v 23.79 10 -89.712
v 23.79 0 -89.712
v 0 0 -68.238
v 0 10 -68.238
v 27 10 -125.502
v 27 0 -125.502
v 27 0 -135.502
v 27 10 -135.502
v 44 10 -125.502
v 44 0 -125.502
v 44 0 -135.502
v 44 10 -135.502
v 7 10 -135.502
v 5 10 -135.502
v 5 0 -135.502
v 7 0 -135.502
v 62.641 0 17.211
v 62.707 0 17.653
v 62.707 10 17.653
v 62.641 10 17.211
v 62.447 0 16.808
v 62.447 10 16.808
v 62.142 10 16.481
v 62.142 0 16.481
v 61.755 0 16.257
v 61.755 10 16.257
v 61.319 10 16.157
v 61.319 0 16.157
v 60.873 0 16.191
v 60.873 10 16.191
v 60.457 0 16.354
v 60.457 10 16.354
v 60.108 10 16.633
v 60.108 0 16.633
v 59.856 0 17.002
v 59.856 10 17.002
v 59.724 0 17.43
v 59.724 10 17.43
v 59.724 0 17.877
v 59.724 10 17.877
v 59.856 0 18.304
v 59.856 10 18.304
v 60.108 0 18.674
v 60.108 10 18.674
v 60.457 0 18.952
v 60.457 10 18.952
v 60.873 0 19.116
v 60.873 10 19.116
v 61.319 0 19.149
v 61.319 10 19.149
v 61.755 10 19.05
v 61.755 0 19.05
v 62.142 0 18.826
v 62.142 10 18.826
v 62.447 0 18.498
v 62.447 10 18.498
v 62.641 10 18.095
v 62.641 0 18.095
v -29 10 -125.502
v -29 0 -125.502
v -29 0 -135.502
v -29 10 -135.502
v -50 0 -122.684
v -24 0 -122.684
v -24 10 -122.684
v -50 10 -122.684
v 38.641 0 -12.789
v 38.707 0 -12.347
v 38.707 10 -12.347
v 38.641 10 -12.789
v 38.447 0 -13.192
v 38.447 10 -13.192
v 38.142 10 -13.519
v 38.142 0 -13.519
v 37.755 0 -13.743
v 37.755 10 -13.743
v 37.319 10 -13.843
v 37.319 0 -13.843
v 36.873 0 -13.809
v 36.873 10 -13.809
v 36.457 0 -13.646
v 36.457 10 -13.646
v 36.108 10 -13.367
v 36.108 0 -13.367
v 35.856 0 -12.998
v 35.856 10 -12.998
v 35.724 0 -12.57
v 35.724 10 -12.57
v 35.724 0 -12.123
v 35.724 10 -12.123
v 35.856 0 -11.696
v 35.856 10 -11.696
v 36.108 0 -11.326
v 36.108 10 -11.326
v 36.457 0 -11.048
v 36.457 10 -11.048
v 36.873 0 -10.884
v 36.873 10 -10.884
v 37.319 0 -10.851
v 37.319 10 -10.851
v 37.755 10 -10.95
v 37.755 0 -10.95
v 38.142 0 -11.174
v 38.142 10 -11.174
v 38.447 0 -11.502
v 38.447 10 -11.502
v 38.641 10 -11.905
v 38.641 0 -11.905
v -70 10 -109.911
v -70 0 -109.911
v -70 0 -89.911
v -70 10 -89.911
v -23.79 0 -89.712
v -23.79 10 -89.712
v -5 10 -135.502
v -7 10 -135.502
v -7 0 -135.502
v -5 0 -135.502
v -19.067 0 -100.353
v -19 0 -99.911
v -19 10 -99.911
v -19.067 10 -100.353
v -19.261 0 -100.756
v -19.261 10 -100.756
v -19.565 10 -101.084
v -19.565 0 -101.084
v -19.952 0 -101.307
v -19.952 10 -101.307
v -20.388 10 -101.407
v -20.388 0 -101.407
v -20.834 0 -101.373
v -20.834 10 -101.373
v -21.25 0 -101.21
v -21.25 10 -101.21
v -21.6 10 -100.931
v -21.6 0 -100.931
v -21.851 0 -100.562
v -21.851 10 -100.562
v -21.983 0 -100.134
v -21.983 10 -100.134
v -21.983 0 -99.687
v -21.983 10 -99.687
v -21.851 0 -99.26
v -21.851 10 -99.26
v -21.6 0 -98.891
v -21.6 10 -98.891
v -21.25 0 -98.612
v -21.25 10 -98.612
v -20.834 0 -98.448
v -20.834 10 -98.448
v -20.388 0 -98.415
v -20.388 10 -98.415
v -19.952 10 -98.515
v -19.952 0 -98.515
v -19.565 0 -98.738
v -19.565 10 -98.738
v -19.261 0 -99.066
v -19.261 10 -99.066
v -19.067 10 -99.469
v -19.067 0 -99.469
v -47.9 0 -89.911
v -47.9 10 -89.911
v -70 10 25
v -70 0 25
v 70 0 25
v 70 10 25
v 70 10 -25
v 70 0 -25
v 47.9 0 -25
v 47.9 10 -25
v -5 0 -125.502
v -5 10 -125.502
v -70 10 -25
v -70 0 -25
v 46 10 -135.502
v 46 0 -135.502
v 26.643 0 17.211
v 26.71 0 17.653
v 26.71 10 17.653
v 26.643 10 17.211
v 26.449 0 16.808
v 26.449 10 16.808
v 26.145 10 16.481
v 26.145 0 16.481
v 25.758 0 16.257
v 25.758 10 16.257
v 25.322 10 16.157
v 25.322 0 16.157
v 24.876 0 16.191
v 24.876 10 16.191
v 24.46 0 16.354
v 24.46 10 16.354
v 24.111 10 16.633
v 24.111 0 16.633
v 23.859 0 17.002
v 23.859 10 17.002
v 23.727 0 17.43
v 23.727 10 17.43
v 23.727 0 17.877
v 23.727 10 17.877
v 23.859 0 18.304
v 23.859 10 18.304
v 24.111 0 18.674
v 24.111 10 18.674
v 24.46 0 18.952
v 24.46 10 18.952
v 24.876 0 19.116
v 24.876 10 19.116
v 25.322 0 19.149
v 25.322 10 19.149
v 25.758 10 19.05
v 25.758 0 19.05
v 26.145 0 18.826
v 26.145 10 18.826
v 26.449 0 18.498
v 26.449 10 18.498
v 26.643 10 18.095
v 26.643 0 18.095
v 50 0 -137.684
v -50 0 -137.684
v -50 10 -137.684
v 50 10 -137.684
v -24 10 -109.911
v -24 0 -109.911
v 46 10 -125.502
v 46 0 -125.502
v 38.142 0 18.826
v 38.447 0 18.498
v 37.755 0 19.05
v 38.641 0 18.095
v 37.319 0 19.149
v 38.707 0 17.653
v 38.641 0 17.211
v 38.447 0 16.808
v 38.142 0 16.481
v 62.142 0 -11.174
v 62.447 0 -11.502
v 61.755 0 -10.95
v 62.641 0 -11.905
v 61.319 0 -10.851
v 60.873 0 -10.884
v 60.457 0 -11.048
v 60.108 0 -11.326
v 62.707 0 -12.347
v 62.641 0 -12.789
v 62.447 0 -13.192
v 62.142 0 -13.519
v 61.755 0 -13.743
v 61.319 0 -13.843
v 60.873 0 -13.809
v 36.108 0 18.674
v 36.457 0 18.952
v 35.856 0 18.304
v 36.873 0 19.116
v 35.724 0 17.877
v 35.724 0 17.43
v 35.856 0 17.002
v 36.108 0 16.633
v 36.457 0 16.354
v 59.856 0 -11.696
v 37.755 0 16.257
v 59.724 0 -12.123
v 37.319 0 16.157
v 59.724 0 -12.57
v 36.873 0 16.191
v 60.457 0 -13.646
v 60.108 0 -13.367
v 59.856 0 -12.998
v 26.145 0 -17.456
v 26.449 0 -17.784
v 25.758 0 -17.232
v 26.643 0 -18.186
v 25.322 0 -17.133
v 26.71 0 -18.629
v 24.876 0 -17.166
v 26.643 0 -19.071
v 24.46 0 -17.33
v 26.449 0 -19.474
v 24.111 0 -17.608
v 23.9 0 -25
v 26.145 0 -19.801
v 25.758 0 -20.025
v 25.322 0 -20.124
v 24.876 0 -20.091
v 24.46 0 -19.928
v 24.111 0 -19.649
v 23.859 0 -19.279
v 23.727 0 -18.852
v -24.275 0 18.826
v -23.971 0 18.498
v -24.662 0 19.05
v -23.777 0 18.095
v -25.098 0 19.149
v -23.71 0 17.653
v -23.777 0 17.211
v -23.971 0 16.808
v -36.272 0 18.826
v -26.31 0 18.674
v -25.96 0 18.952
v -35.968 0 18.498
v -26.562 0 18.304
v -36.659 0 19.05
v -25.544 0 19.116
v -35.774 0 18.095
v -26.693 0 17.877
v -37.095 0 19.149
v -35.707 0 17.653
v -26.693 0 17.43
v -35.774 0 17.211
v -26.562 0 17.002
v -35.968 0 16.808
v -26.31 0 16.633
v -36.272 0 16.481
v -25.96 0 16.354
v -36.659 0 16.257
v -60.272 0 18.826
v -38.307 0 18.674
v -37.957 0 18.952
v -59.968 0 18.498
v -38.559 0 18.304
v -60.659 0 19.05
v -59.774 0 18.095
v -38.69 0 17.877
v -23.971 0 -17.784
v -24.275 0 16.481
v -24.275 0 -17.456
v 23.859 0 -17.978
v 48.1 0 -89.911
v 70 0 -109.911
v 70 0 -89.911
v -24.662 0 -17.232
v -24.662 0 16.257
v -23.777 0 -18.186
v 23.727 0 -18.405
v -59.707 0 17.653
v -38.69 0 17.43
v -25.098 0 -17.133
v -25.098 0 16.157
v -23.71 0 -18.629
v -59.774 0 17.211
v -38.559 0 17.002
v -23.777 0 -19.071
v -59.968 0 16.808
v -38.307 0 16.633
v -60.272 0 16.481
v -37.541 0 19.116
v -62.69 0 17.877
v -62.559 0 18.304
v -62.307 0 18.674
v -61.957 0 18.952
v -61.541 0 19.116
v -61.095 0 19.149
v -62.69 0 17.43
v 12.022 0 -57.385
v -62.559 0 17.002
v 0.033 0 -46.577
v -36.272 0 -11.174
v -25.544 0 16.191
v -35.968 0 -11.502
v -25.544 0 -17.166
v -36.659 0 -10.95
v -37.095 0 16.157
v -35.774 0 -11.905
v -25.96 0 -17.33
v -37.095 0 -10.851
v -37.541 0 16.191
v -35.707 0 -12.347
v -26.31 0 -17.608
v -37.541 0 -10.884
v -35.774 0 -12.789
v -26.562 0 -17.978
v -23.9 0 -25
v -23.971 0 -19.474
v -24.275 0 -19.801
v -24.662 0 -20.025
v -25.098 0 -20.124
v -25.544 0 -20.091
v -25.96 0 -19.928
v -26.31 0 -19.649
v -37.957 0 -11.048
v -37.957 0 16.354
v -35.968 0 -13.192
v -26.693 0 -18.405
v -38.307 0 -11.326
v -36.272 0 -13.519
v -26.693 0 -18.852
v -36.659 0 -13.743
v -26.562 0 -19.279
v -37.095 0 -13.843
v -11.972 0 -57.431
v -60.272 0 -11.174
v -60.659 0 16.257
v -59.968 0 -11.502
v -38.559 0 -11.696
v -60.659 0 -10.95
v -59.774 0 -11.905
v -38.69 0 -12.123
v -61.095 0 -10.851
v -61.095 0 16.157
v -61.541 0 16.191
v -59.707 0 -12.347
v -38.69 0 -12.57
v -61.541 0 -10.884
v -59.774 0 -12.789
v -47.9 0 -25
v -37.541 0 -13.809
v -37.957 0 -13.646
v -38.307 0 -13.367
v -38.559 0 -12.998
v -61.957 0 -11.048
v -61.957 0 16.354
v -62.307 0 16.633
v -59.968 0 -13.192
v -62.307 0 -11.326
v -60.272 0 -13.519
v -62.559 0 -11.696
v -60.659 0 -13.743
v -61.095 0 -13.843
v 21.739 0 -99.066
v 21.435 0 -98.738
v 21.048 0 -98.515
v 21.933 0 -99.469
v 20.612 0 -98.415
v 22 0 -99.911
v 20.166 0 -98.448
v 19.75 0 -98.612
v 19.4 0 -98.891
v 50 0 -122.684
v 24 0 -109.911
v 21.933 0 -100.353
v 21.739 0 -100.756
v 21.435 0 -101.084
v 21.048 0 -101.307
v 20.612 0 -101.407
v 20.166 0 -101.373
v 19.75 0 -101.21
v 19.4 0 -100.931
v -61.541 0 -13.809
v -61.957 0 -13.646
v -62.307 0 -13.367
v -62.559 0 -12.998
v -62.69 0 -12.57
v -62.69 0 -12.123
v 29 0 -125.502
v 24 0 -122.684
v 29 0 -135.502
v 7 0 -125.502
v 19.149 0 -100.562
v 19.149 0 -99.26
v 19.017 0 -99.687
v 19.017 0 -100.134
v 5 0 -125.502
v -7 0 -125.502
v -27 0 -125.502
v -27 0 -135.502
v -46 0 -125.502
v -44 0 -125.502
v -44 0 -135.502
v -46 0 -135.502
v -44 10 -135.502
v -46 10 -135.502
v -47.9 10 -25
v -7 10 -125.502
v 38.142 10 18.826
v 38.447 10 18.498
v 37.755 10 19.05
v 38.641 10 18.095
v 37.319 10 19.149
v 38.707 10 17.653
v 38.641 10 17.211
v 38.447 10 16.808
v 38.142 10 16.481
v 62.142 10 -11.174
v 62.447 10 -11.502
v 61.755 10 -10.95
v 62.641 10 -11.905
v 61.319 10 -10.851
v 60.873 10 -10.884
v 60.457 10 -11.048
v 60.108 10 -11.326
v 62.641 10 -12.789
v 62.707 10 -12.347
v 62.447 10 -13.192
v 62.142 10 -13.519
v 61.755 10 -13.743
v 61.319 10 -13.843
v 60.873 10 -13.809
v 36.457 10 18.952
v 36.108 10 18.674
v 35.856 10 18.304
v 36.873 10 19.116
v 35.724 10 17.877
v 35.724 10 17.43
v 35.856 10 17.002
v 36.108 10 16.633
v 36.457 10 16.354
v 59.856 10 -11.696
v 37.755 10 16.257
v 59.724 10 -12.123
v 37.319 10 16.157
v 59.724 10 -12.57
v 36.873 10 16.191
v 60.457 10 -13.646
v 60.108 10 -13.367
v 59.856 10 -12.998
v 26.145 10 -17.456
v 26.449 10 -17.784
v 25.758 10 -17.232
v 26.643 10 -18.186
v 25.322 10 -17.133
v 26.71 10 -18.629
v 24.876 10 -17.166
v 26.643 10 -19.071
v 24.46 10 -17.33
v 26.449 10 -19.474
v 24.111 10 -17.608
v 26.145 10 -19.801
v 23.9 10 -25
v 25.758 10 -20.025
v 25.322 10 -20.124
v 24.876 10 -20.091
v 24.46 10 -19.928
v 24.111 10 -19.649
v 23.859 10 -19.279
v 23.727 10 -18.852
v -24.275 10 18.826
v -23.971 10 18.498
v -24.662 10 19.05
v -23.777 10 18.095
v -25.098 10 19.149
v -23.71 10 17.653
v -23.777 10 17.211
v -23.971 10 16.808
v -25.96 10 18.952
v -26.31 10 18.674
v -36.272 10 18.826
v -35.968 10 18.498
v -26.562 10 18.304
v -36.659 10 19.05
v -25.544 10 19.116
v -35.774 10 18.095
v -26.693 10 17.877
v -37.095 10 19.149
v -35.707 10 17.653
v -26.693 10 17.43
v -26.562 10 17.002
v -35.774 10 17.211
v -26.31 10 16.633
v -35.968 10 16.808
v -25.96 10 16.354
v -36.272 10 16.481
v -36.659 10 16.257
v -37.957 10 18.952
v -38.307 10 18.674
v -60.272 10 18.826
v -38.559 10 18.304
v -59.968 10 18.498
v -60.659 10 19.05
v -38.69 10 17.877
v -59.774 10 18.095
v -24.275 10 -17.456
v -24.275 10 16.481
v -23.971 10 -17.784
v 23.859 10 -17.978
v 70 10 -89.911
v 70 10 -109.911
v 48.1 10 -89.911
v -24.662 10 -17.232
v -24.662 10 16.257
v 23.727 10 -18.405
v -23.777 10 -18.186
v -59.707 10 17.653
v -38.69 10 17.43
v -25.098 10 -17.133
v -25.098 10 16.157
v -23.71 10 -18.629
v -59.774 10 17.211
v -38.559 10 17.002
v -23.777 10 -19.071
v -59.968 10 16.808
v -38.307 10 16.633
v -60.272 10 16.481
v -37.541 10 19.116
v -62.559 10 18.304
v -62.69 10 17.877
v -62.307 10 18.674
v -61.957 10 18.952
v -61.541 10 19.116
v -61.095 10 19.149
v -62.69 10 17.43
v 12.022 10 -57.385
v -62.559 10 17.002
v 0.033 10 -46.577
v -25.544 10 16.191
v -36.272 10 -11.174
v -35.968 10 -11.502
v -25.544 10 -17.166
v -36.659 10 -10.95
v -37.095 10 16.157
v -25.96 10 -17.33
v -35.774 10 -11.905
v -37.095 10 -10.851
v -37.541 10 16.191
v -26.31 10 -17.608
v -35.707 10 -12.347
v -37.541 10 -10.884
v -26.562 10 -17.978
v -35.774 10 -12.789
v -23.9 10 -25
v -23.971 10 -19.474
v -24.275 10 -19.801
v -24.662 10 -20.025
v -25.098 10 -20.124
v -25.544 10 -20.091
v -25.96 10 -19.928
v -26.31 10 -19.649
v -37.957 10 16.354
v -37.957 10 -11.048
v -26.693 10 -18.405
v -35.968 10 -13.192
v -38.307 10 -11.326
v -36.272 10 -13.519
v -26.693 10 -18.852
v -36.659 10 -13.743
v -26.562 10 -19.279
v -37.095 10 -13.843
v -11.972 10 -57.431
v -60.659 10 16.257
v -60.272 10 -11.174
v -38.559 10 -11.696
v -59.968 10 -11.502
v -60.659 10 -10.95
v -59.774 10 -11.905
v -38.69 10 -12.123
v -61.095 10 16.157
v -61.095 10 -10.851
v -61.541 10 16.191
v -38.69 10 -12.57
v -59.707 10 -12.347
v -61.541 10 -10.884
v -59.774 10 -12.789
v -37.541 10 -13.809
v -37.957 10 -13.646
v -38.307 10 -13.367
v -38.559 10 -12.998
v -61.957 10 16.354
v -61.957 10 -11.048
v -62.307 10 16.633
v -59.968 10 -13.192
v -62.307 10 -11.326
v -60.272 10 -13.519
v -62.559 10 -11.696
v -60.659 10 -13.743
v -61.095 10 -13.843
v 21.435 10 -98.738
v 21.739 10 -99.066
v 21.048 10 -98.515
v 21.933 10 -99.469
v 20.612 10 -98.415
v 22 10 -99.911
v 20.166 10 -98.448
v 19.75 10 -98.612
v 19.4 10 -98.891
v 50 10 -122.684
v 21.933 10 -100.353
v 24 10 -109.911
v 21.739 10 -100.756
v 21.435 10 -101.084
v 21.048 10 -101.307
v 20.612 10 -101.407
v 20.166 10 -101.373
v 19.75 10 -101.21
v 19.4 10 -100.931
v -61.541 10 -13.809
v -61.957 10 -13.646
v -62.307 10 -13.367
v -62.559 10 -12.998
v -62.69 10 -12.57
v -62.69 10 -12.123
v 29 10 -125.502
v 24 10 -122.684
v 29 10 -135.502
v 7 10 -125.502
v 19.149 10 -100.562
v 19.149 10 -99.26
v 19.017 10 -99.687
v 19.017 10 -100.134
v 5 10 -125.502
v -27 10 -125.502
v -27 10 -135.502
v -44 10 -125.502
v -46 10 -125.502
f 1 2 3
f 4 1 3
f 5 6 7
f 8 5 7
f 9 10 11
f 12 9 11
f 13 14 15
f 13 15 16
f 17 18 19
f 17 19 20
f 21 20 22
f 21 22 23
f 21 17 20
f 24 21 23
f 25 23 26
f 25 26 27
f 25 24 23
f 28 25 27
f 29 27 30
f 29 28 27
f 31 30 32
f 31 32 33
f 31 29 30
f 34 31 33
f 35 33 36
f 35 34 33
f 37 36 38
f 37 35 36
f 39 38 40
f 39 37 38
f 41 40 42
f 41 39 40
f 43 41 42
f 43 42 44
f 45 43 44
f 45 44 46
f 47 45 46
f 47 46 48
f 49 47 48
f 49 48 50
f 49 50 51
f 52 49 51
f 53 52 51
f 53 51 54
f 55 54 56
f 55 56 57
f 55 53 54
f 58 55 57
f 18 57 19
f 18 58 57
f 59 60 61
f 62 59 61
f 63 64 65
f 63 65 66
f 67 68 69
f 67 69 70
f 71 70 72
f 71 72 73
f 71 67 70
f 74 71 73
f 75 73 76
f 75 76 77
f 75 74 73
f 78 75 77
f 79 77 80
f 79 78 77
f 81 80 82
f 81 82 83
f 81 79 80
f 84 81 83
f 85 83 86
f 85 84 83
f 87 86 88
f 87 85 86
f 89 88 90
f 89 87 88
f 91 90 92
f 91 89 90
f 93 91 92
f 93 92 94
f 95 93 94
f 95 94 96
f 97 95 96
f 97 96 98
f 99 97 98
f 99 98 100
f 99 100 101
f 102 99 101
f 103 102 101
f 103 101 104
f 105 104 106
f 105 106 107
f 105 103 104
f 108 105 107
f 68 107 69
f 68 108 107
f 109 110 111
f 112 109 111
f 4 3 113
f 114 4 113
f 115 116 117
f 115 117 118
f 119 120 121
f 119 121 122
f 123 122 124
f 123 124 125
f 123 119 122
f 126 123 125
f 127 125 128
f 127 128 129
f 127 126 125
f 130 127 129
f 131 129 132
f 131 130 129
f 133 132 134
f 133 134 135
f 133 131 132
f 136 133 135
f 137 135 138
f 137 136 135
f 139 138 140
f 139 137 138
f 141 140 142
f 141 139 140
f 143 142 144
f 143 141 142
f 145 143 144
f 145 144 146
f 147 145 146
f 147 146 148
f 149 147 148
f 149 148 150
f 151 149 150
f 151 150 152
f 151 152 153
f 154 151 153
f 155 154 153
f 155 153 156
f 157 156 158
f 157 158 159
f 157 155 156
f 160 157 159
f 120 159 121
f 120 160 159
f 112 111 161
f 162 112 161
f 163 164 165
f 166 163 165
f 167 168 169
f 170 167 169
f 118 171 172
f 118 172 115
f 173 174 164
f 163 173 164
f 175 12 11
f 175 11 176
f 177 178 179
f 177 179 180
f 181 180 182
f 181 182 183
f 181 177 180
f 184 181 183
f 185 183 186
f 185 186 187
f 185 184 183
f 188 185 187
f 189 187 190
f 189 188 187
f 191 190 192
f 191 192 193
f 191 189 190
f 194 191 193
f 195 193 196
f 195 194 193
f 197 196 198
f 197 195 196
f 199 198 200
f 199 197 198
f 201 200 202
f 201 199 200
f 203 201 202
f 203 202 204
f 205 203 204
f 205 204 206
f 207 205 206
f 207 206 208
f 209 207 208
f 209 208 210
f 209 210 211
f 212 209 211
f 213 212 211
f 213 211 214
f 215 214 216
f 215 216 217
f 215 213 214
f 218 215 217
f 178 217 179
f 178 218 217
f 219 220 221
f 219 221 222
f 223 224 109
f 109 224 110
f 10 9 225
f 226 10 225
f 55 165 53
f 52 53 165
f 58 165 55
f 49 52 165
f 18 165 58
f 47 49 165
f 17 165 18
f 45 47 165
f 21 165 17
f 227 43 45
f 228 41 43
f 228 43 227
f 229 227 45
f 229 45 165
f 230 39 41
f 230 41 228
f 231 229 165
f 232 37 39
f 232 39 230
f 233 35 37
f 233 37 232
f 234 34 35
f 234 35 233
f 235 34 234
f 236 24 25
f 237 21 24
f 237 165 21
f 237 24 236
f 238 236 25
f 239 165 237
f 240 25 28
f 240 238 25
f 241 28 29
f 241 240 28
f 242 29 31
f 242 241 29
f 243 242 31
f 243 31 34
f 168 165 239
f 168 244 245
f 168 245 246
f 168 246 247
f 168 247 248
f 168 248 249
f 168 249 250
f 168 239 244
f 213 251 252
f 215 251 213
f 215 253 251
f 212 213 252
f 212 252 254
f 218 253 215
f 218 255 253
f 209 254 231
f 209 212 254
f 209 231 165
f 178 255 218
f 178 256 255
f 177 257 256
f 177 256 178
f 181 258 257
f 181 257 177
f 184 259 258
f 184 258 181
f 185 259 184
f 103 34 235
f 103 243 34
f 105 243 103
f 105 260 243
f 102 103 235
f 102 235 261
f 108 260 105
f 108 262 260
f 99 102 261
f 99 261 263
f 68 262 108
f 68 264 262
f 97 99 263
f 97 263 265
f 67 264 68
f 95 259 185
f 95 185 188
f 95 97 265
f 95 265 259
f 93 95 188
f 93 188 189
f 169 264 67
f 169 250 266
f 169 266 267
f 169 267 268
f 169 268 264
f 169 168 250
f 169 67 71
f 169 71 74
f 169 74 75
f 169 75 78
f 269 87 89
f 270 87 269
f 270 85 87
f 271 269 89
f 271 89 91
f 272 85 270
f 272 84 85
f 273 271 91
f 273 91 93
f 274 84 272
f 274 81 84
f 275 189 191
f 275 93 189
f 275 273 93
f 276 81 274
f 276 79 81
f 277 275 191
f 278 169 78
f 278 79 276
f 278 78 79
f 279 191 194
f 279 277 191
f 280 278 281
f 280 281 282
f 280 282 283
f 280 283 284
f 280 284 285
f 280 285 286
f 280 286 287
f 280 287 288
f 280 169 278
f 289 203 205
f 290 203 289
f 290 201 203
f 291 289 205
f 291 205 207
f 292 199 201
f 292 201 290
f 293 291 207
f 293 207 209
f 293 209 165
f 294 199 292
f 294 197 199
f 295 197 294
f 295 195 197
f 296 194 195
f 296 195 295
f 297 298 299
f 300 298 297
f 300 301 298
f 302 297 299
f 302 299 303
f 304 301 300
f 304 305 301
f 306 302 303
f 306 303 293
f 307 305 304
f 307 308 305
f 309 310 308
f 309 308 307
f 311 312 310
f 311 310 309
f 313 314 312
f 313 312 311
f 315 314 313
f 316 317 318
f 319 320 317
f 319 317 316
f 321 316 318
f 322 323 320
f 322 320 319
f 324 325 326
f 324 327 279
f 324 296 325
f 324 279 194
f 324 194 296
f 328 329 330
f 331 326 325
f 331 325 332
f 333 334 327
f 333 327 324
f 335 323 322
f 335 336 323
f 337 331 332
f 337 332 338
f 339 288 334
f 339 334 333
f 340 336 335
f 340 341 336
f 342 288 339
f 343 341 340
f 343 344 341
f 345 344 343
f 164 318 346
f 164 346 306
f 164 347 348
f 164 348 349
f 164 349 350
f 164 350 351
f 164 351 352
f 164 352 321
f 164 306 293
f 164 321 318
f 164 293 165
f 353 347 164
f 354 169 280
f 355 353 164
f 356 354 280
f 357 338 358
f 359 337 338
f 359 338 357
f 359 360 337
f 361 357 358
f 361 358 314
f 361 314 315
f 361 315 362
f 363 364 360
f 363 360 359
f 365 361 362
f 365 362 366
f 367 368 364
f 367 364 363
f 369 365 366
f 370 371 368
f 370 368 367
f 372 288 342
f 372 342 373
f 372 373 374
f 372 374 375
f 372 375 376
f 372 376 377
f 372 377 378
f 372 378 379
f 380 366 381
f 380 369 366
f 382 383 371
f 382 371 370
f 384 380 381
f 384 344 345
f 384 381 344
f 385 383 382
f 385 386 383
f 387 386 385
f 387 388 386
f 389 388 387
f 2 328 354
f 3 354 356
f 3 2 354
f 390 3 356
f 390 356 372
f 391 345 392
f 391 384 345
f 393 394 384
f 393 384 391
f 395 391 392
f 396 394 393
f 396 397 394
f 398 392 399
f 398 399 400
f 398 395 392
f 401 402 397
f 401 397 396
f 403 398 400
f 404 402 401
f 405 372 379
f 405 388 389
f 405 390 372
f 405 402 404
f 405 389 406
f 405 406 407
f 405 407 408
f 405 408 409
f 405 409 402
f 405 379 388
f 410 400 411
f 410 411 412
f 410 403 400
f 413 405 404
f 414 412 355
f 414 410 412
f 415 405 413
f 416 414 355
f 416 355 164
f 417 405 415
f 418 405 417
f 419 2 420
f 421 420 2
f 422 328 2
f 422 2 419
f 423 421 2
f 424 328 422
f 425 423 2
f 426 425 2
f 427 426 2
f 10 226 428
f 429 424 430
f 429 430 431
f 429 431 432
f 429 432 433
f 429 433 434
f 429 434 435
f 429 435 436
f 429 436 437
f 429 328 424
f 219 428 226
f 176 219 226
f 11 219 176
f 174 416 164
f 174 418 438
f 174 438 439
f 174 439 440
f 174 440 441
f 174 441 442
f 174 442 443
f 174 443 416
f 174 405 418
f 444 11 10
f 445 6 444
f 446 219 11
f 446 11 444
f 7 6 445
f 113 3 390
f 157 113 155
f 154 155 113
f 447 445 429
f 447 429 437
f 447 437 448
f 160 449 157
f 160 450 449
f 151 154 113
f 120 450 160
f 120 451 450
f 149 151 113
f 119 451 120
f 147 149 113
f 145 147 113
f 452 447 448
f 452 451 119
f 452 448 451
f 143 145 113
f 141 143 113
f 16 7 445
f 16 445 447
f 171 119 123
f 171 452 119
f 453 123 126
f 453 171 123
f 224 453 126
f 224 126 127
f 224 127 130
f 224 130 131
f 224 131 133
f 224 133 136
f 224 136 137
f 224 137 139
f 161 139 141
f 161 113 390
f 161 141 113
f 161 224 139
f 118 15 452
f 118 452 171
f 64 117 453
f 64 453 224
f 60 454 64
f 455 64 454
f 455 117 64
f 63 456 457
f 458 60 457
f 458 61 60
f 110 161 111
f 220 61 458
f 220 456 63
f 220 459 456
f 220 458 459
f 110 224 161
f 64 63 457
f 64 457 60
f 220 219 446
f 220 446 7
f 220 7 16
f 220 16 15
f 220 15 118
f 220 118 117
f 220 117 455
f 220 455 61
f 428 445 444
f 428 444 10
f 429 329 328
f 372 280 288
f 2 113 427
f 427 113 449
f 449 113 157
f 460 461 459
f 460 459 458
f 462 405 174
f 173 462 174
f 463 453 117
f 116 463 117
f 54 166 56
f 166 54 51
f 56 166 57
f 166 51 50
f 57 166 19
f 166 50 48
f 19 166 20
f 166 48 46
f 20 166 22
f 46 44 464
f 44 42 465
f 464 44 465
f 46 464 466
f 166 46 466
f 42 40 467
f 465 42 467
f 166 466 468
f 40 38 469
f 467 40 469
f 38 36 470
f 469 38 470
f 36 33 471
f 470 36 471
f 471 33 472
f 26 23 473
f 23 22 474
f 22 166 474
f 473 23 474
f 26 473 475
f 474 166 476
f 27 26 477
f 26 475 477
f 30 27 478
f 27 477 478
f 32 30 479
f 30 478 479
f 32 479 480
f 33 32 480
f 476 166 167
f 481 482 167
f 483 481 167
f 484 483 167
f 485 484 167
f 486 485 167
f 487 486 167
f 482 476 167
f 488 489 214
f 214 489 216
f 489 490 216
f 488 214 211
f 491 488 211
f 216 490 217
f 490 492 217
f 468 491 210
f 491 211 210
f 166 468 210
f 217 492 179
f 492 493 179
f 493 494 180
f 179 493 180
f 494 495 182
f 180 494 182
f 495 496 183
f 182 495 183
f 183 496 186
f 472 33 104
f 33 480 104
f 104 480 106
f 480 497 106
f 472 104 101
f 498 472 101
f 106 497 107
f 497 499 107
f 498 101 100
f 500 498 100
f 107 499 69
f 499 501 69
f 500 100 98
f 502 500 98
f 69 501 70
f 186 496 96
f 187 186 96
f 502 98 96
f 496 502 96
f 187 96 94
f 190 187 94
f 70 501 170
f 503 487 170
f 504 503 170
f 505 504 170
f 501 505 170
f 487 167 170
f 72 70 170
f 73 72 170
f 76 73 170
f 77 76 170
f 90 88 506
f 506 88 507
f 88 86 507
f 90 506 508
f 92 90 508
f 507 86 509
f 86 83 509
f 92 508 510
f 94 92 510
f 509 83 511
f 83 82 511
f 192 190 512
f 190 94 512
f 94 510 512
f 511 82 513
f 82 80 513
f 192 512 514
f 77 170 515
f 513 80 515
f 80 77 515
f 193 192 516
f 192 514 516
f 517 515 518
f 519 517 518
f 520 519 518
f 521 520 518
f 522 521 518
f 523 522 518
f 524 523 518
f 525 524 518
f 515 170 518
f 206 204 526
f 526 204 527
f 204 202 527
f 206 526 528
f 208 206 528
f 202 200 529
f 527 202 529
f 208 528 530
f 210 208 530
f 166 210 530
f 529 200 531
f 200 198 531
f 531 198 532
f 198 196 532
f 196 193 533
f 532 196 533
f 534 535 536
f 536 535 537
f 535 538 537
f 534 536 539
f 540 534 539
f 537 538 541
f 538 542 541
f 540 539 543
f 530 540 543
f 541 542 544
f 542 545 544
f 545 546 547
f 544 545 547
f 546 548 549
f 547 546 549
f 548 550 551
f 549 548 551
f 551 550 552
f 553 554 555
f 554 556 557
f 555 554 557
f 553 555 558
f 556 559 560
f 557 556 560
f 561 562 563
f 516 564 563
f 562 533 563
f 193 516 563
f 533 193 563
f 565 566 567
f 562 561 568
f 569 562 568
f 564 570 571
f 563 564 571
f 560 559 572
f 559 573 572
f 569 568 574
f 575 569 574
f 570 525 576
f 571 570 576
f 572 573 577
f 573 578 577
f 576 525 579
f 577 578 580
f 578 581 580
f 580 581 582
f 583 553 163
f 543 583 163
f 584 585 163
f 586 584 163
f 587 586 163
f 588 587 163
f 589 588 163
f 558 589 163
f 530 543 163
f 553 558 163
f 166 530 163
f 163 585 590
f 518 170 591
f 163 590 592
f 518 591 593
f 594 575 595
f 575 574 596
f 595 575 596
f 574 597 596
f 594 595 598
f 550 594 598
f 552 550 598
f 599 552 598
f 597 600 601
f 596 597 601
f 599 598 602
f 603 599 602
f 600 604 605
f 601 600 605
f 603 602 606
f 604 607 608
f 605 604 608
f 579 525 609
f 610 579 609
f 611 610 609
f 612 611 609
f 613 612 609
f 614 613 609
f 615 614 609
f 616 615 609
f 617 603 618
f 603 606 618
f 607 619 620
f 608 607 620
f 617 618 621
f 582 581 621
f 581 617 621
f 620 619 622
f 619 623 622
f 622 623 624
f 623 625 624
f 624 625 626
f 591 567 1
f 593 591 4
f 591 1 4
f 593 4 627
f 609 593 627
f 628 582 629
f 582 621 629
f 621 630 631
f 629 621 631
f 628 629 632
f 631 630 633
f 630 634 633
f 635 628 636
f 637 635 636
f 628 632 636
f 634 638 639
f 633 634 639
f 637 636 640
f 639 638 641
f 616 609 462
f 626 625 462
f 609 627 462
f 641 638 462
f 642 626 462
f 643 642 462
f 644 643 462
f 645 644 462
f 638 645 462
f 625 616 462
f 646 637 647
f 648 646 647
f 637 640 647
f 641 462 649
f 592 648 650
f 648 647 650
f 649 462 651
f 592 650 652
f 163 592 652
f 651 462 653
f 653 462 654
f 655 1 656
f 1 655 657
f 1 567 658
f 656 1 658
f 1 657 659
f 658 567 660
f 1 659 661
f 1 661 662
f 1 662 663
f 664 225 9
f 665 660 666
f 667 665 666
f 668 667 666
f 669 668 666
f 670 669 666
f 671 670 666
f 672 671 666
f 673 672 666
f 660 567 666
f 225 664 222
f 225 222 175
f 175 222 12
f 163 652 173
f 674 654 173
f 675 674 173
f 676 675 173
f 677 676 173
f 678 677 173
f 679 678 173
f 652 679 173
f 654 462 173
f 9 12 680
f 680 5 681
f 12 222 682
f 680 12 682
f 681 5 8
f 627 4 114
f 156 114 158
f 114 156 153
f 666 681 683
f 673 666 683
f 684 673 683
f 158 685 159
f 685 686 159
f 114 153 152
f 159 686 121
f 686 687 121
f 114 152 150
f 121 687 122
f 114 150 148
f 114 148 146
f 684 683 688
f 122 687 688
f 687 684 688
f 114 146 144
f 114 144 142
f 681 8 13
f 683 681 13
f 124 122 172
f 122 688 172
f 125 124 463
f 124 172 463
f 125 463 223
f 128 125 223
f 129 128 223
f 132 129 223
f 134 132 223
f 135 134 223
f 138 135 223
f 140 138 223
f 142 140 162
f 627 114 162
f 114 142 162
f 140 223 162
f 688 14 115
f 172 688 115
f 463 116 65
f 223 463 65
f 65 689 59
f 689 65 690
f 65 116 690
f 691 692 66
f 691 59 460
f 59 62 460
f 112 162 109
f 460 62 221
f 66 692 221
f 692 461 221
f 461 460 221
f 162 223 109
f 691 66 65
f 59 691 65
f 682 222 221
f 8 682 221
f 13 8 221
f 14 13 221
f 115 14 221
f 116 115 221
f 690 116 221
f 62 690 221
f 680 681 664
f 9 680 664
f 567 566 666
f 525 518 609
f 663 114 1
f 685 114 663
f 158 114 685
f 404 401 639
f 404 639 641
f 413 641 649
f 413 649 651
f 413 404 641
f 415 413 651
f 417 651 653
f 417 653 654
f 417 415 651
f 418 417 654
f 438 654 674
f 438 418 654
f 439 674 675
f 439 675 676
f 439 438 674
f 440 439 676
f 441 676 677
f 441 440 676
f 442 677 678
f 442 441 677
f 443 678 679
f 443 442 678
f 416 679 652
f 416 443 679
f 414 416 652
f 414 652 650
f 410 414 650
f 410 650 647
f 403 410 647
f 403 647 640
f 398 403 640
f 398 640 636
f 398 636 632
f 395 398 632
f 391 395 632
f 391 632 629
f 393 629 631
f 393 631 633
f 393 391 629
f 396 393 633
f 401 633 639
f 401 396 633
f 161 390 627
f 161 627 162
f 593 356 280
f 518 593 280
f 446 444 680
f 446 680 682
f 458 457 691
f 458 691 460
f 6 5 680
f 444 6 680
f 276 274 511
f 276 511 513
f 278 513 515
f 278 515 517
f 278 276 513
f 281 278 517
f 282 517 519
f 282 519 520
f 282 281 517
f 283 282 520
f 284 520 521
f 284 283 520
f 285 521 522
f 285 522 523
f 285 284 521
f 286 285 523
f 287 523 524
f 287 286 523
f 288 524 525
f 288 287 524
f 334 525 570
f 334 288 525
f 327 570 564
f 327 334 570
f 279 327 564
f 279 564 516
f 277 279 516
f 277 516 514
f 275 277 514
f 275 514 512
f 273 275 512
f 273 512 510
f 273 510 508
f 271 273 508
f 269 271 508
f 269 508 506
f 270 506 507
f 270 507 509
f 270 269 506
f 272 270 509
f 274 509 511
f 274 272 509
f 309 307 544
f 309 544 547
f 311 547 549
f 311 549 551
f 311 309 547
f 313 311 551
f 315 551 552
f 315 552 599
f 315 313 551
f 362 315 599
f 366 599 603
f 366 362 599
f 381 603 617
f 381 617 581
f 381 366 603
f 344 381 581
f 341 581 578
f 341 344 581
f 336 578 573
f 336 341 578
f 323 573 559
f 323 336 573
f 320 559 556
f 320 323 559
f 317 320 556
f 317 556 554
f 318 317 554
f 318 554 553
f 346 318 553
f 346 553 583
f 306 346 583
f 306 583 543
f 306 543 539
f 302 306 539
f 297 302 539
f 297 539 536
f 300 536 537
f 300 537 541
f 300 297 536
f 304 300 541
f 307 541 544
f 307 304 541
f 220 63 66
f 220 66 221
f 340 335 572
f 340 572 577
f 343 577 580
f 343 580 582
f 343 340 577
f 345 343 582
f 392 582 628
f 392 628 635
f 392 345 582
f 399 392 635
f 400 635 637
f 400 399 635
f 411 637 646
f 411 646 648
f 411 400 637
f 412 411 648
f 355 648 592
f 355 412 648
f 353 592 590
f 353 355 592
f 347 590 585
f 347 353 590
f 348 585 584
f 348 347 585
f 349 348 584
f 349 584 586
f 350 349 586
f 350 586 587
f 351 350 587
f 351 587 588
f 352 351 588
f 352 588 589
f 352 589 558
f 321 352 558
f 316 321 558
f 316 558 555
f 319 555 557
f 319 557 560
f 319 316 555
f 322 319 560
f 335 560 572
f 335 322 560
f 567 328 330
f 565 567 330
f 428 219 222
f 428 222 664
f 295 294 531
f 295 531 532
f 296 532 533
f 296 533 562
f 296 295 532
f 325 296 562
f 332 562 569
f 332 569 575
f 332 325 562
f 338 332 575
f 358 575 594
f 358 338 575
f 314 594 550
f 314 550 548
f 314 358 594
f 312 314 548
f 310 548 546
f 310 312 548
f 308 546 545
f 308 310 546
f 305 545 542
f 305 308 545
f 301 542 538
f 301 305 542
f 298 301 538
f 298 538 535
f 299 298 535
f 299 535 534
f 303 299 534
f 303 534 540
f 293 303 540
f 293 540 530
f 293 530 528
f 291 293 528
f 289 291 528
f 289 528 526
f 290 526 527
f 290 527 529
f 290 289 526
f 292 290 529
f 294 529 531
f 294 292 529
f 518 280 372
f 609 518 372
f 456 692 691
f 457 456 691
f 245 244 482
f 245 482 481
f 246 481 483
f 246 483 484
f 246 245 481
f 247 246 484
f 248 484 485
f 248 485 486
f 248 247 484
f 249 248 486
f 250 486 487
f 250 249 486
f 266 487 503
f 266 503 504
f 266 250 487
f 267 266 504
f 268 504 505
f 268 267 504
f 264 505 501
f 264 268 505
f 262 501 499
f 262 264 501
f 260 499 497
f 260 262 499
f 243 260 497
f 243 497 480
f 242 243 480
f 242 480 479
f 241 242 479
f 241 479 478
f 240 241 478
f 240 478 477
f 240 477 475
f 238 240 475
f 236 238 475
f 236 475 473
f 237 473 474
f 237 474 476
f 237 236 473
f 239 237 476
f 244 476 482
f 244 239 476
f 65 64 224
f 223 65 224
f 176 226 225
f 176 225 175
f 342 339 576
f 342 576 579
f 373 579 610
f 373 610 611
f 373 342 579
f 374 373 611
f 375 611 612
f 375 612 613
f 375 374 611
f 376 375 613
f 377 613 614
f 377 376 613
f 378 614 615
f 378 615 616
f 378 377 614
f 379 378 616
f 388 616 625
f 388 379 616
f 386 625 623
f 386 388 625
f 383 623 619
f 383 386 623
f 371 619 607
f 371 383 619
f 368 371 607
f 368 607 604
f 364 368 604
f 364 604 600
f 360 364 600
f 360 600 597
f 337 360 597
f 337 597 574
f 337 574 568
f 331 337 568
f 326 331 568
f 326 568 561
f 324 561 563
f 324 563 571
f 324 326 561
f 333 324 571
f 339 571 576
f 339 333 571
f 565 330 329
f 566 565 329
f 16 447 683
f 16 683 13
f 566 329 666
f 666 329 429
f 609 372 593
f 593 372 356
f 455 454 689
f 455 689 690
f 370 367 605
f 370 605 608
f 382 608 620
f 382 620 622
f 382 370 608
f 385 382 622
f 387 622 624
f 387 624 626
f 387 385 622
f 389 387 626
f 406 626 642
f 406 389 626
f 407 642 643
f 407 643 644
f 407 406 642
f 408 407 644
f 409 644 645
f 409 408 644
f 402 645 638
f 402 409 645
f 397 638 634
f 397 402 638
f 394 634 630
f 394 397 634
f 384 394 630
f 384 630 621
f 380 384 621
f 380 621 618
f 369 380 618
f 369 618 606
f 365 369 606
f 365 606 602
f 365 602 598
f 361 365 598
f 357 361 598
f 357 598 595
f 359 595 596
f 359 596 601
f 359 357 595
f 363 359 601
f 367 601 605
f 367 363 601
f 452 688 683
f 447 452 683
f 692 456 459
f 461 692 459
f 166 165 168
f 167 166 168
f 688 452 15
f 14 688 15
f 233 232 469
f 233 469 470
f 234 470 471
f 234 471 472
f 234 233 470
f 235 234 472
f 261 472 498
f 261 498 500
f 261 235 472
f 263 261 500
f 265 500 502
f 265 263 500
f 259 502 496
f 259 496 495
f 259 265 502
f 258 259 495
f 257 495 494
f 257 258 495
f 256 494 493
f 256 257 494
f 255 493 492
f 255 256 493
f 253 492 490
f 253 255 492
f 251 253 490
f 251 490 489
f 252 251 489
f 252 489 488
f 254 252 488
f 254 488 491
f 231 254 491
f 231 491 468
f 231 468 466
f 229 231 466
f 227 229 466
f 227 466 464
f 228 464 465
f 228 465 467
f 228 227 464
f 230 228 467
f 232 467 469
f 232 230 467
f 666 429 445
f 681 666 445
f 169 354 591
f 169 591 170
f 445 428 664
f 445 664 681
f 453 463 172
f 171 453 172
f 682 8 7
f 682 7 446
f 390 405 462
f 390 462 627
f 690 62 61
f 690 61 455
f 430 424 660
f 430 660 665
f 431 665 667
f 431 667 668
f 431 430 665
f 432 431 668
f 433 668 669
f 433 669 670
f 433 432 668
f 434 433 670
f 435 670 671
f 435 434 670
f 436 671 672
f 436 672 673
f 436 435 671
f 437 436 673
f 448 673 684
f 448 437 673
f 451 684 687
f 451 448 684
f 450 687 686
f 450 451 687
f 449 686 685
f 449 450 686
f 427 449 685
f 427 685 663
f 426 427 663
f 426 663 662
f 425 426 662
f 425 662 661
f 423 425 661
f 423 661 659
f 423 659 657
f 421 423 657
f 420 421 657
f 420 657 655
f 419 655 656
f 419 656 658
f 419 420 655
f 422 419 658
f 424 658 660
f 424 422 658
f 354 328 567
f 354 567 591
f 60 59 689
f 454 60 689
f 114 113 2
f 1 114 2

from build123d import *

# Parameters (mm, degrees)
SKETCH_1_R      = 1.5
SKETCH_1_W      = 2
SKETCH_1_H      = 10
EXTRUDE_1_DEPTH = 10


with BuildPart() as part:
    # 草图1 → 凸台-拉伸1 (new body)
    with BuildSketch(Plane(origin=(0, 0, 0), x_dir=(1, 0, 0), z_dir=(0, 1, 0))):
        Polygon((-68, 25), (-47.9, 25), (-11.972426803, 57.430508537), (-47.9, 89.910872233), (-68, 89.910872233), (-70, 89.910872233), (-70, 91.910872233), (-70, 107.910872233), (-70, 109.910872233), (-68, 109.910872233), (-24, 109.910872233), (-24, 114.855181995), (-24, 122.684078109), (-50, 122.684078109), (-50, 137.684078109), (50, 137.684078109), (50, 122.684078109), (24, 122.684078109), (24, 114.855181995), (24, 109.910872233), (68, 109.910872233), (70, 109.910872233), (70, 107.910872233), (70, 91.910872233), (70, 89.910872233), (68, 89.910872233), (48.1, 89.910872233), (12.022357286, 57.385438113), (47.9, 25), (68, 25), (70, 25), (70, 23), (70, -23), (70, -25), (68, -25), (-68, -25), (-70, -25), (-70, -23), (-70, 23), (-70, 25), align=None)
        with Locations((-61.207159892, 12.346732779)):
            Circle(SKETCH_1_R, mode=Mode.SUBTRACT)
        with Locations((-37.207159892, 12.346732779)):
            Circle(SKETCH_1_R, mode=Mode.SUBTRACT)
        with Locations((-37.207159892, -17.653267221)):
            Circle(SKETCH_1_R, mode=Mode.SUBTRACT)
        with Locations((-61.207159892, -17.653267221)):
            Circle(SKETCH_1_R, mode=Mode.SUBTRACT)
        with Locations((61.207159892, -17.653267221)):
            Circle(SKETCH_1_R, mode=Mode.SUBTRACT)
        with Locations((37.207159892, -17.653267221)):
            Circle(SKETCH_1_R, mode=Mode.SUBTRACT)
        with Locations((37.207159892, 12.346732779)):
            Circle(SKETCH_1_R, mode=Mode.SUBTRACT)
        with Locations((61.207159892, 12.346732779)):
            Circle(SKETCH_1_R, mode=Mode.SUBTRACT)
        with Locations((-20.5, 99.910872233)):
            Circle(SKETCH_1_R, mode=Mode.SUBTRACT)
        with Locations((20.5, 99.910872233)):
            Circle(SKETCH_1_R, mode=Mode.SUBTRACT)
        with Locations((-25.210114711, 18.628541516)):
            Circle(SKETCH_1_R, mode=Mode.SUBTRACT)
        with Locations((25.210114711, 18.628541516)):
            Circle(SKETCH_1_R, mode=Mode.SUBTRACT)
        with Locations((-25.210114711, -17.653267221)):
            Circle(SKETCH_1_R, mode=Mode.SUBTRACT)
        with Locations((25.210114711, -17.653267221)):
            Circle(SKETCH_1_R, mode=Mode.SUBTRACT)
        with Locations((6, 130.50199448)):
            Rectangle(SKETCH_1_W, SKETCH_1_H, mode=Mode.SUBTRACT)
        with Locations((-6, 130.50199448)):
            Rectangle(SKETCH_1_W, SKETCH_1_H, mode=Mode.SUBTRACT)
        with Locations((28, 130.50199448)):
            Rectangle(SKETCH_1_W, SKETCH_1_H, mode=Mode.SUBTRACT)
        with Locations((45, 130.50199448)):
            Rectangle(SKETCH_1_W, SKETCH_1_H, mode=Mode.SUBTRACT)
        with Locations((-45, 130.50199448)):
            Rectangle(SKETCH_1_W, SKETCH_1_H, mode=Mode.SUBTRACT)
        with Locations((-28, 130.50199448)):
            Rectangle(SKETCH_1_W, SKETCH_1_H, mode=Mode.SUBTRACT)
        Polygon((-23.789706762, 89.711680759), (23.789706762, 89.711680759), (0, 68.237581075), align=None, mode=Mode.SUBTRACT)
        Polygon((-23.9, 25), (0.033240612, 46.576771159), (23.9, 25), align=None, mode=Mode.SUBTRACT)
    extrude(amount=EXTRUDE_1_DEPTH)


solid = part.part
